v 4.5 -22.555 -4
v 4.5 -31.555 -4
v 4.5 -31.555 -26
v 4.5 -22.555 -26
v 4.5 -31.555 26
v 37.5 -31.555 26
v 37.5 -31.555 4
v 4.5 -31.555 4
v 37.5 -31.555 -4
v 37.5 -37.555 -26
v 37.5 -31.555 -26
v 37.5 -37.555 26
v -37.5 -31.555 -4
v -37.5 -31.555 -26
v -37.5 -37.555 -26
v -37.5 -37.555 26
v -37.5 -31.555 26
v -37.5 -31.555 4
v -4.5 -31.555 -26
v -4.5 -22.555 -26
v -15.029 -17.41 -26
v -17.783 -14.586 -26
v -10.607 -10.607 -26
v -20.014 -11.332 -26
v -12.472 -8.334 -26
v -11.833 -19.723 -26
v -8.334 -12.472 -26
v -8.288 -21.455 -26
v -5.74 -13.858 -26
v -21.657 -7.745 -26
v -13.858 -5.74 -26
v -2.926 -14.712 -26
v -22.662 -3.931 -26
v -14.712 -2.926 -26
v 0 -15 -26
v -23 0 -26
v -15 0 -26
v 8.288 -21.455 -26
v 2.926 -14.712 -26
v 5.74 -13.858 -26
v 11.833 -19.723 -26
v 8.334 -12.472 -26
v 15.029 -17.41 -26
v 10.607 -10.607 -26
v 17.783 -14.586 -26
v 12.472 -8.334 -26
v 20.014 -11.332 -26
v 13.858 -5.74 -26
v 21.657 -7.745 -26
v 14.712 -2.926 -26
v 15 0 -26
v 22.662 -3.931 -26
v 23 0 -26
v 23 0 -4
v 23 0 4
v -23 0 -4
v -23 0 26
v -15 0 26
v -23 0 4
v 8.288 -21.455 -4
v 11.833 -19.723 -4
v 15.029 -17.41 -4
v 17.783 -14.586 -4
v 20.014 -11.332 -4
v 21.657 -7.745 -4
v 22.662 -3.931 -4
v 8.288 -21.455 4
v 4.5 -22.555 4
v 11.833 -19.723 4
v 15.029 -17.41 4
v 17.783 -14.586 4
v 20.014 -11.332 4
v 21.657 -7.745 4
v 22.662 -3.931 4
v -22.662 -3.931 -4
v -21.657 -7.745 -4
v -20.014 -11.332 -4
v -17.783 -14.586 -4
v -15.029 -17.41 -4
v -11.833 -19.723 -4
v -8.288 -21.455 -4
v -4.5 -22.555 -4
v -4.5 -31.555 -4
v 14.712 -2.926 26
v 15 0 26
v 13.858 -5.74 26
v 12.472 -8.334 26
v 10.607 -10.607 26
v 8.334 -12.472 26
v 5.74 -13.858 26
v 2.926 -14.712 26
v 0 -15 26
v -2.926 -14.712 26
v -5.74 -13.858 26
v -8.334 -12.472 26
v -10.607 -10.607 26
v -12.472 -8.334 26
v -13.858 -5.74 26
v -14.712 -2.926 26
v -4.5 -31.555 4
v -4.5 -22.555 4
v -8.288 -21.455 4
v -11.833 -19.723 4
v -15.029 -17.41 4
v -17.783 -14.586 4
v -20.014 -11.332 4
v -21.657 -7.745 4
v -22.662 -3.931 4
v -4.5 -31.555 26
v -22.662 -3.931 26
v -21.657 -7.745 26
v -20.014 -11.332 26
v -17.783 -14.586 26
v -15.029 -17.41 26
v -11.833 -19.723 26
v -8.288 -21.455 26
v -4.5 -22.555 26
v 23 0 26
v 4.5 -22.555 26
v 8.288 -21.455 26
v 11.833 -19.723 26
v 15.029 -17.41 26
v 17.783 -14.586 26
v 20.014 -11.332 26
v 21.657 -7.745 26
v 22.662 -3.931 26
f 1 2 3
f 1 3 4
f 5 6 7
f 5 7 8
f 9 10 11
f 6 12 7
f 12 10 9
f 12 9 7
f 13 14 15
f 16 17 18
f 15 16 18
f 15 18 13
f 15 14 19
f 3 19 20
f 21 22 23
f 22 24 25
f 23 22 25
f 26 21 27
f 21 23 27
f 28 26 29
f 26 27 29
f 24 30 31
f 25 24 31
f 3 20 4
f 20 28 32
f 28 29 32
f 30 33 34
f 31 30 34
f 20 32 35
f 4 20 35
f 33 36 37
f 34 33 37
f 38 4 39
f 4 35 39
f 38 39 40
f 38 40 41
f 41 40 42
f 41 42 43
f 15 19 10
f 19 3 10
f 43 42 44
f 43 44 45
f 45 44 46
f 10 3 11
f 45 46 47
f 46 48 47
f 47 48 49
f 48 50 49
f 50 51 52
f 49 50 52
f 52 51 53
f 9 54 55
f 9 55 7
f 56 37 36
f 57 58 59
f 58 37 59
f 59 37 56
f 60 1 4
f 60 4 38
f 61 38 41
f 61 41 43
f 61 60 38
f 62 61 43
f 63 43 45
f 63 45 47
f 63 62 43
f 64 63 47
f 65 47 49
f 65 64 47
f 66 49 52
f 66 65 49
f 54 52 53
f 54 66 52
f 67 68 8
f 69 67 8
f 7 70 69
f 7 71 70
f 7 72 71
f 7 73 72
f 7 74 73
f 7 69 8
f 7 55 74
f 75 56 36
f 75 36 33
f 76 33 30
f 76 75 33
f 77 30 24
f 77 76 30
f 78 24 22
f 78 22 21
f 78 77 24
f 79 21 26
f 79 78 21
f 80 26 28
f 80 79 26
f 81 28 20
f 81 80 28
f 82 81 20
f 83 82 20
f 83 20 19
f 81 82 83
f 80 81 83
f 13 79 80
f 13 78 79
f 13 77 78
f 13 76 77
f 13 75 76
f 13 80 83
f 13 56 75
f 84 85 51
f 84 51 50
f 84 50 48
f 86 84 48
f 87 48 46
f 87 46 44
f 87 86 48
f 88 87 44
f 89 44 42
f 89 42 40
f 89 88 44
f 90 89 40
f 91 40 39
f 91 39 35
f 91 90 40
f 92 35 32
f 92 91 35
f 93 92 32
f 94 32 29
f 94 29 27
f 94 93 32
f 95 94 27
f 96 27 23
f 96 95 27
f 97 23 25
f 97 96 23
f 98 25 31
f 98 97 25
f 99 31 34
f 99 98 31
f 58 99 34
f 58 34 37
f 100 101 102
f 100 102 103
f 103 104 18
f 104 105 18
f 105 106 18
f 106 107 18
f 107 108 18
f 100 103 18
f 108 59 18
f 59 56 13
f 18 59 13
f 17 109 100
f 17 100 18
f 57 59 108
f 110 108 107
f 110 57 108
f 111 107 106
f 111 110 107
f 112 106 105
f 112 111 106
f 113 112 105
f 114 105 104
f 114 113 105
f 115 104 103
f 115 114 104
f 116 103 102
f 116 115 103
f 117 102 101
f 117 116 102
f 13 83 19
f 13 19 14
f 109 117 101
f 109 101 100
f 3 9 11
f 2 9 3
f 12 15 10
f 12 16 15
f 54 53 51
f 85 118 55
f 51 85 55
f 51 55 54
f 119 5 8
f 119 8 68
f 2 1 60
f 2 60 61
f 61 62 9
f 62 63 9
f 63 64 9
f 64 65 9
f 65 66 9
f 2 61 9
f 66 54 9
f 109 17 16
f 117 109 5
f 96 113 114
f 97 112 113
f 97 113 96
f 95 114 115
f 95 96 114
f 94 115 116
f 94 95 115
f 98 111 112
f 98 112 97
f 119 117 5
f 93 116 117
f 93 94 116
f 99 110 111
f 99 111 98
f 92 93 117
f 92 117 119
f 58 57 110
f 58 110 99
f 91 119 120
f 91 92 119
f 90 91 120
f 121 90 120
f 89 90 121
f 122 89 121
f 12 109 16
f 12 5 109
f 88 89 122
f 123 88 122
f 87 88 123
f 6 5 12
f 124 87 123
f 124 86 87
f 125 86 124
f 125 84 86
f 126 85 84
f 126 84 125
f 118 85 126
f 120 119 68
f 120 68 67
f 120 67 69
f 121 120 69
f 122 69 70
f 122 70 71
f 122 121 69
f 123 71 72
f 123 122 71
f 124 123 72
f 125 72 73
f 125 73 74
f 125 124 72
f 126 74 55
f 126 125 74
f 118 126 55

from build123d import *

# Parameters (mm, degrees)
BOSS_EXTRUDE1_DEPTH = 26
RIB1_REACH          = 61.099
SKETCH2_WALL_W      = 154.925032954
SKETCH2_WALL_H      = 8


with BuildPart() as part:
    # Sketch1 → Boss-Extrude1 (new, symmetric)
    with BuildSketch(Plane.XY):
        with BuildLine():
            Line((-37.5, -37.555487137), (0, -37.555487137))
            Line((0, -37.555487137), (0, -15))
            ThreePointArc((0, -15), (-10.606601718, -10.606601718), (-15, 0))
            Line((-15, 0), (-23, 0))
            ThreePointArc((-23, 0), (-17.783419244, -14.585952146), (-4.5, -22.555487137))
            Line((-4.5, -22.555487137), (-4.5, -31.555487137))
            Line((-4.5, -31.555487137), (-37.5, -31.555487137))
            Line((-37.5, -31.555487137), (-37.5, -37.555487137))
        make_face()
        with BuildLine():
            Line((0, -37.555487137), (37.5, -37.555487137))
            Line((37.5, -37.555487137), (37.5, -31.555487137))
            Line((37.5, -31.555487137), (4.5, -31.555487137))
            Line((4.5, -31.555487137), (4.5, -22.555487137))
            ThreePointArc((4.5, -22.555487137), (17.783419244, -14.585952146), (23, 0))
            Line((23, 0), (15, 0))
            ThreePointArc((15, 0), (10.606601718, -10.606601718), (0, -15))
            Line((0, -15), (0, -37.555487137))
        make_face()
    extrude(amount=BOSS_EXTRUDE1_DEPTH, both=True)

    # Sketch2 wall → Rib1 (add, up to next)
    with BuildSketch(Plane(origin=(30.25, -15.777743569, 0), x_dir=(0.417536618888, -0.908660097004, 0), z_dir=(0.908660097004, 0.417536618888, 0)), mode=Mode.PRIVATE) as rib1_sk1:
        Rectangle(SKETCH2_WALL_W, SKETCH2_WALL_H)
    rib1_tool1 = extrude(rib1_sk1.sketch, amount=-RIB1_REACH, mode=Mode.PRIVATE) - part.part
    rib1 = rib1_tool1.solids().sort_by_distance((30.25, -15.777743569, 0))[0]
    add(rib1)

    # Mirror1: Rib1 across plane
    add(rib1.mirror(Plane(origin=(0, 0, 0), x_dir=(0, 0, 1), z_dir=(1, 0, 0))))


solid = part.part
